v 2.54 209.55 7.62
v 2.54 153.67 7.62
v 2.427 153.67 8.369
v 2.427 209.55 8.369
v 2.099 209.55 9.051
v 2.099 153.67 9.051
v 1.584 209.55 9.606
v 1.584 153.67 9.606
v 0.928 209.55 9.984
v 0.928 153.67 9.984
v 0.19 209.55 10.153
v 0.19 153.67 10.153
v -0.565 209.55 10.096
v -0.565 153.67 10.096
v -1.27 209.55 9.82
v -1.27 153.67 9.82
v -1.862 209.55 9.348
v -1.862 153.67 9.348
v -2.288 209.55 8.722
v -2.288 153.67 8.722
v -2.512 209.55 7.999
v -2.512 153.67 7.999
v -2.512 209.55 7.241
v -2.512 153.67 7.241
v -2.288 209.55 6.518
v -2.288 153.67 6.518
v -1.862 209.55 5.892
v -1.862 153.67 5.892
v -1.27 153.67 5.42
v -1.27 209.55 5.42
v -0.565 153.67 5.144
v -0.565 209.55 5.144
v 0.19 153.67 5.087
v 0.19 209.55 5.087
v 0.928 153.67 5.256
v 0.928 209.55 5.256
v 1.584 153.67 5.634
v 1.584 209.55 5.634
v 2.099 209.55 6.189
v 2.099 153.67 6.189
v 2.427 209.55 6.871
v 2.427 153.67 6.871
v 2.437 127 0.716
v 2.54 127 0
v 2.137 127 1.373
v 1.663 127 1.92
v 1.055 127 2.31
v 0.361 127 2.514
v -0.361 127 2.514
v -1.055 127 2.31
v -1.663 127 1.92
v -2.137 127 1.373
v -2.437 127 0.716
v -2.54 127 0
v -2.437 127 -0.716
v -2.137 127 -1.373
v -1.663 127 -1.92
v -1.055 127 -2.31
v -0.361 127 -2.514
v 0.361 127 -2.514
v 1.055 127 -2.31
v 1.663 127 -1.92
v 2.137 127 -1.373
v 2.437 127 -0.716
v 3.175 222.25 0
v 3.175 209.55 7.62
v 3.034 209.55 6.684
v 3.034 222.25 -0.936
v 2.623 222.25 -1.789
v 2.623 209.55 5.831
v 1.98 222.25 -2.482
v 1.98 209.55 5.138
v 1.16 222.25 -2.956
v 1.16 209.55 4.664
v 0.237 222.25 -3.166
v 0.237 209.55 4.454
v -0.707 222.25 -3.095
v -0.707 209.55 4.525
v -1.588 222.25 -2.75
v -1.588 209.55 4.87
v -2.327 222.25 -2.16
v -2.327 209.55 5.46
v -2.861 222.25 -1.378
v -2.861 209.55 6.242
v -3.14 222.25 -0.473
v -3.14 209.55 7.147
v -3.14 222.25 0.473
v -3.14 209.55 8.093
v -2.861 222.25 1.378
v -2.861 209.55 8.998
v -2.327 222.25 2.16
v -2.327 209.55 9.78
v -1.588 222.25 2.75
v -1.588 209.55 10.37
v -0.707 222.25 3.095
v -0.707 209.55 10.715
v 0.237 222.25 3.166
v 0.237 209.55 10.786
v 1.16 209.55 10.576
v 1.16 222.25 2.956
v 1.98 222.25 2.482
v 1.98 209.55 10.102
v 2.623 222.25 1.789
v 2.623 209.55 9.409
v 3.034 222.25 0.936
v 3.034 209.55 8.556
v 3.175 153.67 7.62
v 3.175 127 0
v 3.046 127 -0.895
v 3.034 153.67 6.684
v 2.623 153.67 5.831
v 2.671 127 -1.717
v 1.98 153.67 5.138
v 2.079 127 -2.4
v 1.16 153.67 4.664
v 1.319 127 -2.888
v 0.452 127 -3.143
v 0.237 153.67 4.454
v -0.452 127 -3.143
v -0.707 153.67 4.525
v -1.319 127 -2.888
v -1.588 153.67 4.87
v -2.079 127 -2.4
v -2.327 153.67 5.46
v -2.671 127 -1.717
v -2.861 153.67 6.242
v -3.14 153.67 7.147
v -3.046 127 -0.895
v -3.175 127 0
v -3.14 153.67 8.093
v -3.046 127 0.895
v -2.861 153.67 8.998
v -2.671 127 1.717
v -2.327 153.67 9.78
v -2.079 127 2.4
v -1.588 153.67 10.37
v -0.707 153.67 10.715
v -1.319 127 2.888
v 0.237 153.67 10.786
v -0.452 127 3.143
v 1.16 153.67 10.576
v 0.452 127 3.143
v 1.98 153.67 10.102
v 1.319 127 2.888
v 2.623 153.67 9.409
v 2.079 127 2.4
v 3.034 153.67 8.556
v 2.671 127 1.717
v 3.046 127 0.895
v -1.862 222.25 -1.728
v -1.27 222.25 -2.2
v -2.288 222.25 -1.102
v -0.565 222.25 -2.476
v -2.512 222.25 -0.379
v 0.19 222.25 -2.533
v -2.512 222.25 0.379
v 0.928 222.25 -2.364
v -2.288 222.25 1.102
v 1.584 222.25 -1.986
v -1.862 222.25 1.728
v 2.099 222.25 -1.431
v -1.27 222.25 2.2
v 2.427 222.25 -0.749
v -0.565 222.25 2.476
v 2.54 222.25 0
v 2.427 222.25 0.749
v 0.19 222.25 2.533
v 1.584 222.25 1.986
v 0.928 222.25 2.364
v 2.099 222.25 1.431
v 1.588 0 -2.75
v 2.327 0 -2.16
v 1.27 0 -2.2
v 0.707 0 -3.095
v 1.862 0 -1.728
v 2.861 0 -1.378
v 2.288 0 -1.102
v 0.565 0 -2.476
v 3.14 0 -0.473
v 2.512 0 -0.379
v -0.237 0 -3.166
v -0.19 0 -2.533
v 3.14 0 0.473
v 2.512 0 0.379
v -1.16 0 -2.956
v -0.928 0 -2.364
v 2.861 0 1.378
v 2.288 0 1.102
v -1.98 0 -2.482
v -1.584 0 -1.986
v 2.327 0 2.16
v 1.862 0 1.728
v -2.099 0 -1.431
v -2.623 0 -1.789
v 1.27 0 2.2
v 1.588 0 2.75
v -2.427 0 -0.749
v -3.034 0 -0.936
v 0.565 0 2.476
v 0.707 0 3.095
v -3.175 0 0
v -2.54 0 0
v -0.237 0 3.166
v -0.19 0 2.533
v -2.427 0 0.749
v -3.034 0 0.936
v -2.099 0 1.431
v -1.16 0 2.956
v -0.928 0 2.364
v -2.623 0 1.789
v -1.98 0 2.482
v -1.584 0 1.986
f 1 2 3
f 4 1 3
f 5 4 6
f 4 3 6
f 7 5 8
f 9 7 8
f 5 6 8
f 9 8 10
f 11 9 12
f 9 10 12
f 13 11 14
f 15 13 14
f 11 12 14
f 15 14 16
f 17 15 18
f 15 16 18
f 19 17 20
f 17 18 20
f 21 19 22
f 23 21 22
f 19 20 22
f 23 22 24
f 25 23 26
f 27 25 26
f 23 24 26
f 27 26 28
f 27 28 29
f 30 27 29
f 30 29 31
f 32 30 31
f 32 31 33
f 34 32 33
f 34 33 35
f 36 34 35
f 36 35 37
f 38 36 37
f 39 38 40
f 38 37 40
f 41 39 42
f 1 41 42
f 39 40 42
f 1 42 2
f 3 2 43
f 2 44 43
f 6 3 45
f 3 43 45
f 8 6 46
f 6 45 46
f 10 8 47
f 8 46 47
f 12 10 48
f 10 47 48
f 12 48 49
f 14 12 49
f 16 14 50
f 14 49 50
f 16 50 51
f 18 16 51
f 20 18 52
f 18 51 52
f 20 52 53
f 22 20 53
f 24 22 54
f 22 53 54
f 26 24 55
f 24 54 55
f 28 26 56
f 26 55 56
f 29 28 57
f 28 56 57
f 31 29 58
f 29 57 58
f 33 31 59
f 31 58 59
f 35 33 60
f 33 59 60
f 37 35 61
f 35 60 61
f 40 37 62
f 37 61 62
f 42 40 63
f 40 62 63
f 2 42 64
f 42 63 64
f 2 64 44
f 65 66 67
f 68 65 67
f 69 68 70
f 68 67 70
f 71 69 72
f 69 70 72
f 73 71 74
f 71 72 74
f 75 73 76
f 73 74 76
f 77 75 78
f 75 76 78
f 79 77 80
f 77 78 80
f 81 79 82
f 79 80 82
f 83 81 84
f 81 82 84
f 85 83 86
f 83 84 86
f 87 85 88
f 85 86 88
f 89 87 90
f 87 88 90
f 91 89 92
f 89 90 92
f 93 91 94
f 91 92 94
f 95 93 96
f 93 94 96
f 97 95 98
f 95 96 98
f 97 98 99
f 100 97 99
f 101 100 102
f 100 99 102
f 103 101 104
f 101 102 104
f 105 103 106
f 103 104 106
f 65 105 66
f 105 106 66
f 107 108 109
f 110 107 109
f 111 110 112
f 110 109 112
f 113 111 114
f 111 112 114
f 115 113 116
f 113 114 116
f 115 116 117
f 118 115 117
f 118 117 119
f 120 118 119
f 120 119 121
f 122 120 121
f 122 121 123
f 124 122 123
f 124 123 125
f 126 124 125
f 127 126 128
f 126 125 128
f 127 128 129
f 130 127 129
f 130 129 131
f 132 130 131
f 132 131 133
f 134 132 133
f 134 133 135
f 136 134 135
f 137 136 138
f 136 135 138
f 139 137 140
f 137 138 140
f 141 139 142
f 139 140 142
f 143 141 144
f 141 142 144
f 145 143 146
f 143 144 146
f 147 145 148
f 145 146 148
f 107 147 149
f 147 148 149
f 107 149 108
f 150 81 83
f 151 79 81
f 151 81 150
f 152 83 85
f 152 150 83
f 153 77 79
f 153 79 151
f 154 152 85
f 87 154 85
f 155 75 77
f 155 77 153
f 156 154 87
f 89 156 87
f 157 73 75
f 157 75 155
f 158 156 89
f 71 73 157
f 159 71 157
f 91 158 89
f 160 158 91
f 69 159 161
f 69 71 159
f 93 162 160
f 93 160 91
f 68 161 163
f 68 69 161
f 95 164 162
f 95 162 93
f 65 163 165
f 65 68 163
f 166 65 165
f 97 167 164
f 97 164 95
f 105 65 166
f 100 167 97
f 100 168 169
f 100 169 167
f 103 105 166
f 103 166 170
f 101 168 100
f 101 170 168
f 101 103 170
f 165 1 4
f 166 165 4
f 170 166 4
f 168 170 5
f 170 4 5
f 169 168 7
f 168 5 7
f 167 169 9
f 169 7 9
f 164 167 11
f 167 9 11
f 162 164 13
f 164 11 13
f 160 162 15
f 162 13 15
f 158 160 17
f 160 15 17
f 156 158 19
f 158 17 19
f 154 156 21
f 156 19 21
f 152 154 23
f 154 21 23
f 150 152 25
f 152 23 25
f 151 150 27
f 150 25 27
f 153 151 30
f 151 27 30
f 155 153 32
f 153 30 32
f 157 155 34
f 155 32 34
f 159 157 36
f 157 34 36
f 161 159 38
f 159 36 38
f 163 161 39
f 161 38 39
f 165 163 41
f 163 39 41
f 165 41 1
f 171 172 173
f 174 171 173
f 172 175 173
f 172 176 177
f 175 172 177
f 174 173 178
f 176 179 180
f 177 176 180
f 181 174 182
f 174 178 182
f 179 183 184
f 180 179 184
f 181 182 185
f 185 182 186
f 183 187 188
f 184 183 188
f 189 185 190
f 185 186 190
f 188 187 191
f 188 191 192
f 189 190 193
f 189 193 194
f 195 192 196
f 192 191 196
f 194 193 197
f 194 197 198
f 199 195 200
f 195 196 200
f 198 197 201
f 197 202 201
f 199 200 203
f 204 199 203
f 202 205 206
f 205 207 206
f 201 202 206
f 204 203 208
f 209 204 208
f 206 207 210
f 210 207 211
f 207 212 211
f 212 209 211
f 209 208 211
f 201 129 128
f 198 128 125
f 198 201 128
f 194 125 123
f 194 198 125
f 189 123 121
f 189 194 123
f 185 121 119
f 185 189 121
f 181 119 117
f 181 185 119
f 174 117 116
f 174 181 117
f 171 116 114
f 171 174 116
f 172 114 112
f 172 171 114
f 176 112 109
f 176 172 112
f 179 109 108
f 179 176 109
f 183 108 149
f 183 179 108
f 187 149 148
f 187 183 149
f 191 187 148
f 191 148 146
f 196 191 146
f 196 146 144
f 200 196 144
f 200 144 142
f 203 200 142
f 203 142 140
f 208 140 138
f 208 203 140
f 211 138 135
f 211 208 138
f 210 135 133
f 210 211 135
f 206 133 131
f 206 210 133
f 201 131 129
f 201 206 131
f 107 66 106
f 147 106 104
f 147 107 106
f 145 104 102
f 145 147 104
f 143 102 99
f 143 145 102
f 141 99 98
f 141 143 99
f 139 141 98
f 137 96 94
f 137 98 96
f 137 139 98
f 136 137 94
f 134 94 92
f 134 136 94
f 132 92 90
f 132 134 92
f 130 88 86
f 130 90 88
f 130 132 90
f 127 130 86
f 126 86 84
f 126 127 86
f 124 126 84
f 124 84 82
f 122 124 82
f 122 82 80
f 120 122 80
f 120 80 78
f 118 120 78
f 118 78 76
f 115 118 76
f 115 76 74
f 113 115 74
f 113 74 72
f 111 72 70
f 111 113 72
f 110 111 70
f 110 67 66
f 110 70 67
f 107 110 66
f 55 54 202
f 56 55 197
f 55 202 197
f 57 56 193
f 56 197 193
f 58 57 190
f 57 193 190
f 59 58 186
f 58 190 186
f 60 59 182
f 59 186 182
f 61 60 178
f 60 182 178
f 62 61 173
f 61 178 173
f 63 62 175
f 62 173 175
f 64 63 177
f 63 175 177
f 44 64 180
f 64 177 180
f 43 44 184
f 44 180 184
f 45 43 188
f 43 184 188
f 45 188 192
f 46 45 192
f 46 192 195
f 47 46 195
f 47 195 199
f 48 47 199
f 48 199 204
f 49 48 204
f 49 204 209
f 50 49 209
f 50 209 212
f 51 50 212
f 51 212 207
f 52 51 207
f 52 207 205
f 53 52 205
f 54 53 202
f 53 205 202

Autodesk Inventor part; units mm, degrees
ref_plane "YZ Plane" through (0, 0, 0) normal (1, 0, 0) x (0, 1, 0)
ref_plane "XZ Plane" through (0, 0, 0) normal (0, 1, 0) x (-1, 0, 0)
ref_plane "XY Plane" through (0, 0, 0) normal (0, 0, 1) x (1, 0, 0)
sketch "Sketch1" plane through (0, 0, 0) normal (0, 1, 0) x (-1, 0, 0)
  circle A0 centre (0, 0) radius 3.175
  circle A1 centre (0, 0) radius 2.54
  dimension "d0" = 6.35
  dimension "d1" = 5.08
extrude "Extrusion1" add sketch "Sketch1" along normal blind 127
sketch "Sketch7" plane through (0, 127, 0) normal (0, 1, 0) x (1, 0, 0)
  circle A0 centre (0, 0) radius 2.54 projected
  circle A1 centre (0, 0) radius 3.175 projected
sketch "Sketch15" plane through (0, 0, 0) normal (1, 0, 0) x (0, 1, 0)
  line L0 (127, -3.175) -> (127, 3.175) projected
  line L1 (153.67, 7.62) -> (209.55, 7.62)
  line L2 (222.25, 0) -> (209.55, 7.62)
  line L3 (153.67, 7.62) -> (127, 0)
  point P0 (0, 0)
  dimension "d42" = 55.88
sweep "Sweep7" add profiles "Sketch7" path "Sketch15" path curves L3 L1 L2
properties part number "waterpipe"
